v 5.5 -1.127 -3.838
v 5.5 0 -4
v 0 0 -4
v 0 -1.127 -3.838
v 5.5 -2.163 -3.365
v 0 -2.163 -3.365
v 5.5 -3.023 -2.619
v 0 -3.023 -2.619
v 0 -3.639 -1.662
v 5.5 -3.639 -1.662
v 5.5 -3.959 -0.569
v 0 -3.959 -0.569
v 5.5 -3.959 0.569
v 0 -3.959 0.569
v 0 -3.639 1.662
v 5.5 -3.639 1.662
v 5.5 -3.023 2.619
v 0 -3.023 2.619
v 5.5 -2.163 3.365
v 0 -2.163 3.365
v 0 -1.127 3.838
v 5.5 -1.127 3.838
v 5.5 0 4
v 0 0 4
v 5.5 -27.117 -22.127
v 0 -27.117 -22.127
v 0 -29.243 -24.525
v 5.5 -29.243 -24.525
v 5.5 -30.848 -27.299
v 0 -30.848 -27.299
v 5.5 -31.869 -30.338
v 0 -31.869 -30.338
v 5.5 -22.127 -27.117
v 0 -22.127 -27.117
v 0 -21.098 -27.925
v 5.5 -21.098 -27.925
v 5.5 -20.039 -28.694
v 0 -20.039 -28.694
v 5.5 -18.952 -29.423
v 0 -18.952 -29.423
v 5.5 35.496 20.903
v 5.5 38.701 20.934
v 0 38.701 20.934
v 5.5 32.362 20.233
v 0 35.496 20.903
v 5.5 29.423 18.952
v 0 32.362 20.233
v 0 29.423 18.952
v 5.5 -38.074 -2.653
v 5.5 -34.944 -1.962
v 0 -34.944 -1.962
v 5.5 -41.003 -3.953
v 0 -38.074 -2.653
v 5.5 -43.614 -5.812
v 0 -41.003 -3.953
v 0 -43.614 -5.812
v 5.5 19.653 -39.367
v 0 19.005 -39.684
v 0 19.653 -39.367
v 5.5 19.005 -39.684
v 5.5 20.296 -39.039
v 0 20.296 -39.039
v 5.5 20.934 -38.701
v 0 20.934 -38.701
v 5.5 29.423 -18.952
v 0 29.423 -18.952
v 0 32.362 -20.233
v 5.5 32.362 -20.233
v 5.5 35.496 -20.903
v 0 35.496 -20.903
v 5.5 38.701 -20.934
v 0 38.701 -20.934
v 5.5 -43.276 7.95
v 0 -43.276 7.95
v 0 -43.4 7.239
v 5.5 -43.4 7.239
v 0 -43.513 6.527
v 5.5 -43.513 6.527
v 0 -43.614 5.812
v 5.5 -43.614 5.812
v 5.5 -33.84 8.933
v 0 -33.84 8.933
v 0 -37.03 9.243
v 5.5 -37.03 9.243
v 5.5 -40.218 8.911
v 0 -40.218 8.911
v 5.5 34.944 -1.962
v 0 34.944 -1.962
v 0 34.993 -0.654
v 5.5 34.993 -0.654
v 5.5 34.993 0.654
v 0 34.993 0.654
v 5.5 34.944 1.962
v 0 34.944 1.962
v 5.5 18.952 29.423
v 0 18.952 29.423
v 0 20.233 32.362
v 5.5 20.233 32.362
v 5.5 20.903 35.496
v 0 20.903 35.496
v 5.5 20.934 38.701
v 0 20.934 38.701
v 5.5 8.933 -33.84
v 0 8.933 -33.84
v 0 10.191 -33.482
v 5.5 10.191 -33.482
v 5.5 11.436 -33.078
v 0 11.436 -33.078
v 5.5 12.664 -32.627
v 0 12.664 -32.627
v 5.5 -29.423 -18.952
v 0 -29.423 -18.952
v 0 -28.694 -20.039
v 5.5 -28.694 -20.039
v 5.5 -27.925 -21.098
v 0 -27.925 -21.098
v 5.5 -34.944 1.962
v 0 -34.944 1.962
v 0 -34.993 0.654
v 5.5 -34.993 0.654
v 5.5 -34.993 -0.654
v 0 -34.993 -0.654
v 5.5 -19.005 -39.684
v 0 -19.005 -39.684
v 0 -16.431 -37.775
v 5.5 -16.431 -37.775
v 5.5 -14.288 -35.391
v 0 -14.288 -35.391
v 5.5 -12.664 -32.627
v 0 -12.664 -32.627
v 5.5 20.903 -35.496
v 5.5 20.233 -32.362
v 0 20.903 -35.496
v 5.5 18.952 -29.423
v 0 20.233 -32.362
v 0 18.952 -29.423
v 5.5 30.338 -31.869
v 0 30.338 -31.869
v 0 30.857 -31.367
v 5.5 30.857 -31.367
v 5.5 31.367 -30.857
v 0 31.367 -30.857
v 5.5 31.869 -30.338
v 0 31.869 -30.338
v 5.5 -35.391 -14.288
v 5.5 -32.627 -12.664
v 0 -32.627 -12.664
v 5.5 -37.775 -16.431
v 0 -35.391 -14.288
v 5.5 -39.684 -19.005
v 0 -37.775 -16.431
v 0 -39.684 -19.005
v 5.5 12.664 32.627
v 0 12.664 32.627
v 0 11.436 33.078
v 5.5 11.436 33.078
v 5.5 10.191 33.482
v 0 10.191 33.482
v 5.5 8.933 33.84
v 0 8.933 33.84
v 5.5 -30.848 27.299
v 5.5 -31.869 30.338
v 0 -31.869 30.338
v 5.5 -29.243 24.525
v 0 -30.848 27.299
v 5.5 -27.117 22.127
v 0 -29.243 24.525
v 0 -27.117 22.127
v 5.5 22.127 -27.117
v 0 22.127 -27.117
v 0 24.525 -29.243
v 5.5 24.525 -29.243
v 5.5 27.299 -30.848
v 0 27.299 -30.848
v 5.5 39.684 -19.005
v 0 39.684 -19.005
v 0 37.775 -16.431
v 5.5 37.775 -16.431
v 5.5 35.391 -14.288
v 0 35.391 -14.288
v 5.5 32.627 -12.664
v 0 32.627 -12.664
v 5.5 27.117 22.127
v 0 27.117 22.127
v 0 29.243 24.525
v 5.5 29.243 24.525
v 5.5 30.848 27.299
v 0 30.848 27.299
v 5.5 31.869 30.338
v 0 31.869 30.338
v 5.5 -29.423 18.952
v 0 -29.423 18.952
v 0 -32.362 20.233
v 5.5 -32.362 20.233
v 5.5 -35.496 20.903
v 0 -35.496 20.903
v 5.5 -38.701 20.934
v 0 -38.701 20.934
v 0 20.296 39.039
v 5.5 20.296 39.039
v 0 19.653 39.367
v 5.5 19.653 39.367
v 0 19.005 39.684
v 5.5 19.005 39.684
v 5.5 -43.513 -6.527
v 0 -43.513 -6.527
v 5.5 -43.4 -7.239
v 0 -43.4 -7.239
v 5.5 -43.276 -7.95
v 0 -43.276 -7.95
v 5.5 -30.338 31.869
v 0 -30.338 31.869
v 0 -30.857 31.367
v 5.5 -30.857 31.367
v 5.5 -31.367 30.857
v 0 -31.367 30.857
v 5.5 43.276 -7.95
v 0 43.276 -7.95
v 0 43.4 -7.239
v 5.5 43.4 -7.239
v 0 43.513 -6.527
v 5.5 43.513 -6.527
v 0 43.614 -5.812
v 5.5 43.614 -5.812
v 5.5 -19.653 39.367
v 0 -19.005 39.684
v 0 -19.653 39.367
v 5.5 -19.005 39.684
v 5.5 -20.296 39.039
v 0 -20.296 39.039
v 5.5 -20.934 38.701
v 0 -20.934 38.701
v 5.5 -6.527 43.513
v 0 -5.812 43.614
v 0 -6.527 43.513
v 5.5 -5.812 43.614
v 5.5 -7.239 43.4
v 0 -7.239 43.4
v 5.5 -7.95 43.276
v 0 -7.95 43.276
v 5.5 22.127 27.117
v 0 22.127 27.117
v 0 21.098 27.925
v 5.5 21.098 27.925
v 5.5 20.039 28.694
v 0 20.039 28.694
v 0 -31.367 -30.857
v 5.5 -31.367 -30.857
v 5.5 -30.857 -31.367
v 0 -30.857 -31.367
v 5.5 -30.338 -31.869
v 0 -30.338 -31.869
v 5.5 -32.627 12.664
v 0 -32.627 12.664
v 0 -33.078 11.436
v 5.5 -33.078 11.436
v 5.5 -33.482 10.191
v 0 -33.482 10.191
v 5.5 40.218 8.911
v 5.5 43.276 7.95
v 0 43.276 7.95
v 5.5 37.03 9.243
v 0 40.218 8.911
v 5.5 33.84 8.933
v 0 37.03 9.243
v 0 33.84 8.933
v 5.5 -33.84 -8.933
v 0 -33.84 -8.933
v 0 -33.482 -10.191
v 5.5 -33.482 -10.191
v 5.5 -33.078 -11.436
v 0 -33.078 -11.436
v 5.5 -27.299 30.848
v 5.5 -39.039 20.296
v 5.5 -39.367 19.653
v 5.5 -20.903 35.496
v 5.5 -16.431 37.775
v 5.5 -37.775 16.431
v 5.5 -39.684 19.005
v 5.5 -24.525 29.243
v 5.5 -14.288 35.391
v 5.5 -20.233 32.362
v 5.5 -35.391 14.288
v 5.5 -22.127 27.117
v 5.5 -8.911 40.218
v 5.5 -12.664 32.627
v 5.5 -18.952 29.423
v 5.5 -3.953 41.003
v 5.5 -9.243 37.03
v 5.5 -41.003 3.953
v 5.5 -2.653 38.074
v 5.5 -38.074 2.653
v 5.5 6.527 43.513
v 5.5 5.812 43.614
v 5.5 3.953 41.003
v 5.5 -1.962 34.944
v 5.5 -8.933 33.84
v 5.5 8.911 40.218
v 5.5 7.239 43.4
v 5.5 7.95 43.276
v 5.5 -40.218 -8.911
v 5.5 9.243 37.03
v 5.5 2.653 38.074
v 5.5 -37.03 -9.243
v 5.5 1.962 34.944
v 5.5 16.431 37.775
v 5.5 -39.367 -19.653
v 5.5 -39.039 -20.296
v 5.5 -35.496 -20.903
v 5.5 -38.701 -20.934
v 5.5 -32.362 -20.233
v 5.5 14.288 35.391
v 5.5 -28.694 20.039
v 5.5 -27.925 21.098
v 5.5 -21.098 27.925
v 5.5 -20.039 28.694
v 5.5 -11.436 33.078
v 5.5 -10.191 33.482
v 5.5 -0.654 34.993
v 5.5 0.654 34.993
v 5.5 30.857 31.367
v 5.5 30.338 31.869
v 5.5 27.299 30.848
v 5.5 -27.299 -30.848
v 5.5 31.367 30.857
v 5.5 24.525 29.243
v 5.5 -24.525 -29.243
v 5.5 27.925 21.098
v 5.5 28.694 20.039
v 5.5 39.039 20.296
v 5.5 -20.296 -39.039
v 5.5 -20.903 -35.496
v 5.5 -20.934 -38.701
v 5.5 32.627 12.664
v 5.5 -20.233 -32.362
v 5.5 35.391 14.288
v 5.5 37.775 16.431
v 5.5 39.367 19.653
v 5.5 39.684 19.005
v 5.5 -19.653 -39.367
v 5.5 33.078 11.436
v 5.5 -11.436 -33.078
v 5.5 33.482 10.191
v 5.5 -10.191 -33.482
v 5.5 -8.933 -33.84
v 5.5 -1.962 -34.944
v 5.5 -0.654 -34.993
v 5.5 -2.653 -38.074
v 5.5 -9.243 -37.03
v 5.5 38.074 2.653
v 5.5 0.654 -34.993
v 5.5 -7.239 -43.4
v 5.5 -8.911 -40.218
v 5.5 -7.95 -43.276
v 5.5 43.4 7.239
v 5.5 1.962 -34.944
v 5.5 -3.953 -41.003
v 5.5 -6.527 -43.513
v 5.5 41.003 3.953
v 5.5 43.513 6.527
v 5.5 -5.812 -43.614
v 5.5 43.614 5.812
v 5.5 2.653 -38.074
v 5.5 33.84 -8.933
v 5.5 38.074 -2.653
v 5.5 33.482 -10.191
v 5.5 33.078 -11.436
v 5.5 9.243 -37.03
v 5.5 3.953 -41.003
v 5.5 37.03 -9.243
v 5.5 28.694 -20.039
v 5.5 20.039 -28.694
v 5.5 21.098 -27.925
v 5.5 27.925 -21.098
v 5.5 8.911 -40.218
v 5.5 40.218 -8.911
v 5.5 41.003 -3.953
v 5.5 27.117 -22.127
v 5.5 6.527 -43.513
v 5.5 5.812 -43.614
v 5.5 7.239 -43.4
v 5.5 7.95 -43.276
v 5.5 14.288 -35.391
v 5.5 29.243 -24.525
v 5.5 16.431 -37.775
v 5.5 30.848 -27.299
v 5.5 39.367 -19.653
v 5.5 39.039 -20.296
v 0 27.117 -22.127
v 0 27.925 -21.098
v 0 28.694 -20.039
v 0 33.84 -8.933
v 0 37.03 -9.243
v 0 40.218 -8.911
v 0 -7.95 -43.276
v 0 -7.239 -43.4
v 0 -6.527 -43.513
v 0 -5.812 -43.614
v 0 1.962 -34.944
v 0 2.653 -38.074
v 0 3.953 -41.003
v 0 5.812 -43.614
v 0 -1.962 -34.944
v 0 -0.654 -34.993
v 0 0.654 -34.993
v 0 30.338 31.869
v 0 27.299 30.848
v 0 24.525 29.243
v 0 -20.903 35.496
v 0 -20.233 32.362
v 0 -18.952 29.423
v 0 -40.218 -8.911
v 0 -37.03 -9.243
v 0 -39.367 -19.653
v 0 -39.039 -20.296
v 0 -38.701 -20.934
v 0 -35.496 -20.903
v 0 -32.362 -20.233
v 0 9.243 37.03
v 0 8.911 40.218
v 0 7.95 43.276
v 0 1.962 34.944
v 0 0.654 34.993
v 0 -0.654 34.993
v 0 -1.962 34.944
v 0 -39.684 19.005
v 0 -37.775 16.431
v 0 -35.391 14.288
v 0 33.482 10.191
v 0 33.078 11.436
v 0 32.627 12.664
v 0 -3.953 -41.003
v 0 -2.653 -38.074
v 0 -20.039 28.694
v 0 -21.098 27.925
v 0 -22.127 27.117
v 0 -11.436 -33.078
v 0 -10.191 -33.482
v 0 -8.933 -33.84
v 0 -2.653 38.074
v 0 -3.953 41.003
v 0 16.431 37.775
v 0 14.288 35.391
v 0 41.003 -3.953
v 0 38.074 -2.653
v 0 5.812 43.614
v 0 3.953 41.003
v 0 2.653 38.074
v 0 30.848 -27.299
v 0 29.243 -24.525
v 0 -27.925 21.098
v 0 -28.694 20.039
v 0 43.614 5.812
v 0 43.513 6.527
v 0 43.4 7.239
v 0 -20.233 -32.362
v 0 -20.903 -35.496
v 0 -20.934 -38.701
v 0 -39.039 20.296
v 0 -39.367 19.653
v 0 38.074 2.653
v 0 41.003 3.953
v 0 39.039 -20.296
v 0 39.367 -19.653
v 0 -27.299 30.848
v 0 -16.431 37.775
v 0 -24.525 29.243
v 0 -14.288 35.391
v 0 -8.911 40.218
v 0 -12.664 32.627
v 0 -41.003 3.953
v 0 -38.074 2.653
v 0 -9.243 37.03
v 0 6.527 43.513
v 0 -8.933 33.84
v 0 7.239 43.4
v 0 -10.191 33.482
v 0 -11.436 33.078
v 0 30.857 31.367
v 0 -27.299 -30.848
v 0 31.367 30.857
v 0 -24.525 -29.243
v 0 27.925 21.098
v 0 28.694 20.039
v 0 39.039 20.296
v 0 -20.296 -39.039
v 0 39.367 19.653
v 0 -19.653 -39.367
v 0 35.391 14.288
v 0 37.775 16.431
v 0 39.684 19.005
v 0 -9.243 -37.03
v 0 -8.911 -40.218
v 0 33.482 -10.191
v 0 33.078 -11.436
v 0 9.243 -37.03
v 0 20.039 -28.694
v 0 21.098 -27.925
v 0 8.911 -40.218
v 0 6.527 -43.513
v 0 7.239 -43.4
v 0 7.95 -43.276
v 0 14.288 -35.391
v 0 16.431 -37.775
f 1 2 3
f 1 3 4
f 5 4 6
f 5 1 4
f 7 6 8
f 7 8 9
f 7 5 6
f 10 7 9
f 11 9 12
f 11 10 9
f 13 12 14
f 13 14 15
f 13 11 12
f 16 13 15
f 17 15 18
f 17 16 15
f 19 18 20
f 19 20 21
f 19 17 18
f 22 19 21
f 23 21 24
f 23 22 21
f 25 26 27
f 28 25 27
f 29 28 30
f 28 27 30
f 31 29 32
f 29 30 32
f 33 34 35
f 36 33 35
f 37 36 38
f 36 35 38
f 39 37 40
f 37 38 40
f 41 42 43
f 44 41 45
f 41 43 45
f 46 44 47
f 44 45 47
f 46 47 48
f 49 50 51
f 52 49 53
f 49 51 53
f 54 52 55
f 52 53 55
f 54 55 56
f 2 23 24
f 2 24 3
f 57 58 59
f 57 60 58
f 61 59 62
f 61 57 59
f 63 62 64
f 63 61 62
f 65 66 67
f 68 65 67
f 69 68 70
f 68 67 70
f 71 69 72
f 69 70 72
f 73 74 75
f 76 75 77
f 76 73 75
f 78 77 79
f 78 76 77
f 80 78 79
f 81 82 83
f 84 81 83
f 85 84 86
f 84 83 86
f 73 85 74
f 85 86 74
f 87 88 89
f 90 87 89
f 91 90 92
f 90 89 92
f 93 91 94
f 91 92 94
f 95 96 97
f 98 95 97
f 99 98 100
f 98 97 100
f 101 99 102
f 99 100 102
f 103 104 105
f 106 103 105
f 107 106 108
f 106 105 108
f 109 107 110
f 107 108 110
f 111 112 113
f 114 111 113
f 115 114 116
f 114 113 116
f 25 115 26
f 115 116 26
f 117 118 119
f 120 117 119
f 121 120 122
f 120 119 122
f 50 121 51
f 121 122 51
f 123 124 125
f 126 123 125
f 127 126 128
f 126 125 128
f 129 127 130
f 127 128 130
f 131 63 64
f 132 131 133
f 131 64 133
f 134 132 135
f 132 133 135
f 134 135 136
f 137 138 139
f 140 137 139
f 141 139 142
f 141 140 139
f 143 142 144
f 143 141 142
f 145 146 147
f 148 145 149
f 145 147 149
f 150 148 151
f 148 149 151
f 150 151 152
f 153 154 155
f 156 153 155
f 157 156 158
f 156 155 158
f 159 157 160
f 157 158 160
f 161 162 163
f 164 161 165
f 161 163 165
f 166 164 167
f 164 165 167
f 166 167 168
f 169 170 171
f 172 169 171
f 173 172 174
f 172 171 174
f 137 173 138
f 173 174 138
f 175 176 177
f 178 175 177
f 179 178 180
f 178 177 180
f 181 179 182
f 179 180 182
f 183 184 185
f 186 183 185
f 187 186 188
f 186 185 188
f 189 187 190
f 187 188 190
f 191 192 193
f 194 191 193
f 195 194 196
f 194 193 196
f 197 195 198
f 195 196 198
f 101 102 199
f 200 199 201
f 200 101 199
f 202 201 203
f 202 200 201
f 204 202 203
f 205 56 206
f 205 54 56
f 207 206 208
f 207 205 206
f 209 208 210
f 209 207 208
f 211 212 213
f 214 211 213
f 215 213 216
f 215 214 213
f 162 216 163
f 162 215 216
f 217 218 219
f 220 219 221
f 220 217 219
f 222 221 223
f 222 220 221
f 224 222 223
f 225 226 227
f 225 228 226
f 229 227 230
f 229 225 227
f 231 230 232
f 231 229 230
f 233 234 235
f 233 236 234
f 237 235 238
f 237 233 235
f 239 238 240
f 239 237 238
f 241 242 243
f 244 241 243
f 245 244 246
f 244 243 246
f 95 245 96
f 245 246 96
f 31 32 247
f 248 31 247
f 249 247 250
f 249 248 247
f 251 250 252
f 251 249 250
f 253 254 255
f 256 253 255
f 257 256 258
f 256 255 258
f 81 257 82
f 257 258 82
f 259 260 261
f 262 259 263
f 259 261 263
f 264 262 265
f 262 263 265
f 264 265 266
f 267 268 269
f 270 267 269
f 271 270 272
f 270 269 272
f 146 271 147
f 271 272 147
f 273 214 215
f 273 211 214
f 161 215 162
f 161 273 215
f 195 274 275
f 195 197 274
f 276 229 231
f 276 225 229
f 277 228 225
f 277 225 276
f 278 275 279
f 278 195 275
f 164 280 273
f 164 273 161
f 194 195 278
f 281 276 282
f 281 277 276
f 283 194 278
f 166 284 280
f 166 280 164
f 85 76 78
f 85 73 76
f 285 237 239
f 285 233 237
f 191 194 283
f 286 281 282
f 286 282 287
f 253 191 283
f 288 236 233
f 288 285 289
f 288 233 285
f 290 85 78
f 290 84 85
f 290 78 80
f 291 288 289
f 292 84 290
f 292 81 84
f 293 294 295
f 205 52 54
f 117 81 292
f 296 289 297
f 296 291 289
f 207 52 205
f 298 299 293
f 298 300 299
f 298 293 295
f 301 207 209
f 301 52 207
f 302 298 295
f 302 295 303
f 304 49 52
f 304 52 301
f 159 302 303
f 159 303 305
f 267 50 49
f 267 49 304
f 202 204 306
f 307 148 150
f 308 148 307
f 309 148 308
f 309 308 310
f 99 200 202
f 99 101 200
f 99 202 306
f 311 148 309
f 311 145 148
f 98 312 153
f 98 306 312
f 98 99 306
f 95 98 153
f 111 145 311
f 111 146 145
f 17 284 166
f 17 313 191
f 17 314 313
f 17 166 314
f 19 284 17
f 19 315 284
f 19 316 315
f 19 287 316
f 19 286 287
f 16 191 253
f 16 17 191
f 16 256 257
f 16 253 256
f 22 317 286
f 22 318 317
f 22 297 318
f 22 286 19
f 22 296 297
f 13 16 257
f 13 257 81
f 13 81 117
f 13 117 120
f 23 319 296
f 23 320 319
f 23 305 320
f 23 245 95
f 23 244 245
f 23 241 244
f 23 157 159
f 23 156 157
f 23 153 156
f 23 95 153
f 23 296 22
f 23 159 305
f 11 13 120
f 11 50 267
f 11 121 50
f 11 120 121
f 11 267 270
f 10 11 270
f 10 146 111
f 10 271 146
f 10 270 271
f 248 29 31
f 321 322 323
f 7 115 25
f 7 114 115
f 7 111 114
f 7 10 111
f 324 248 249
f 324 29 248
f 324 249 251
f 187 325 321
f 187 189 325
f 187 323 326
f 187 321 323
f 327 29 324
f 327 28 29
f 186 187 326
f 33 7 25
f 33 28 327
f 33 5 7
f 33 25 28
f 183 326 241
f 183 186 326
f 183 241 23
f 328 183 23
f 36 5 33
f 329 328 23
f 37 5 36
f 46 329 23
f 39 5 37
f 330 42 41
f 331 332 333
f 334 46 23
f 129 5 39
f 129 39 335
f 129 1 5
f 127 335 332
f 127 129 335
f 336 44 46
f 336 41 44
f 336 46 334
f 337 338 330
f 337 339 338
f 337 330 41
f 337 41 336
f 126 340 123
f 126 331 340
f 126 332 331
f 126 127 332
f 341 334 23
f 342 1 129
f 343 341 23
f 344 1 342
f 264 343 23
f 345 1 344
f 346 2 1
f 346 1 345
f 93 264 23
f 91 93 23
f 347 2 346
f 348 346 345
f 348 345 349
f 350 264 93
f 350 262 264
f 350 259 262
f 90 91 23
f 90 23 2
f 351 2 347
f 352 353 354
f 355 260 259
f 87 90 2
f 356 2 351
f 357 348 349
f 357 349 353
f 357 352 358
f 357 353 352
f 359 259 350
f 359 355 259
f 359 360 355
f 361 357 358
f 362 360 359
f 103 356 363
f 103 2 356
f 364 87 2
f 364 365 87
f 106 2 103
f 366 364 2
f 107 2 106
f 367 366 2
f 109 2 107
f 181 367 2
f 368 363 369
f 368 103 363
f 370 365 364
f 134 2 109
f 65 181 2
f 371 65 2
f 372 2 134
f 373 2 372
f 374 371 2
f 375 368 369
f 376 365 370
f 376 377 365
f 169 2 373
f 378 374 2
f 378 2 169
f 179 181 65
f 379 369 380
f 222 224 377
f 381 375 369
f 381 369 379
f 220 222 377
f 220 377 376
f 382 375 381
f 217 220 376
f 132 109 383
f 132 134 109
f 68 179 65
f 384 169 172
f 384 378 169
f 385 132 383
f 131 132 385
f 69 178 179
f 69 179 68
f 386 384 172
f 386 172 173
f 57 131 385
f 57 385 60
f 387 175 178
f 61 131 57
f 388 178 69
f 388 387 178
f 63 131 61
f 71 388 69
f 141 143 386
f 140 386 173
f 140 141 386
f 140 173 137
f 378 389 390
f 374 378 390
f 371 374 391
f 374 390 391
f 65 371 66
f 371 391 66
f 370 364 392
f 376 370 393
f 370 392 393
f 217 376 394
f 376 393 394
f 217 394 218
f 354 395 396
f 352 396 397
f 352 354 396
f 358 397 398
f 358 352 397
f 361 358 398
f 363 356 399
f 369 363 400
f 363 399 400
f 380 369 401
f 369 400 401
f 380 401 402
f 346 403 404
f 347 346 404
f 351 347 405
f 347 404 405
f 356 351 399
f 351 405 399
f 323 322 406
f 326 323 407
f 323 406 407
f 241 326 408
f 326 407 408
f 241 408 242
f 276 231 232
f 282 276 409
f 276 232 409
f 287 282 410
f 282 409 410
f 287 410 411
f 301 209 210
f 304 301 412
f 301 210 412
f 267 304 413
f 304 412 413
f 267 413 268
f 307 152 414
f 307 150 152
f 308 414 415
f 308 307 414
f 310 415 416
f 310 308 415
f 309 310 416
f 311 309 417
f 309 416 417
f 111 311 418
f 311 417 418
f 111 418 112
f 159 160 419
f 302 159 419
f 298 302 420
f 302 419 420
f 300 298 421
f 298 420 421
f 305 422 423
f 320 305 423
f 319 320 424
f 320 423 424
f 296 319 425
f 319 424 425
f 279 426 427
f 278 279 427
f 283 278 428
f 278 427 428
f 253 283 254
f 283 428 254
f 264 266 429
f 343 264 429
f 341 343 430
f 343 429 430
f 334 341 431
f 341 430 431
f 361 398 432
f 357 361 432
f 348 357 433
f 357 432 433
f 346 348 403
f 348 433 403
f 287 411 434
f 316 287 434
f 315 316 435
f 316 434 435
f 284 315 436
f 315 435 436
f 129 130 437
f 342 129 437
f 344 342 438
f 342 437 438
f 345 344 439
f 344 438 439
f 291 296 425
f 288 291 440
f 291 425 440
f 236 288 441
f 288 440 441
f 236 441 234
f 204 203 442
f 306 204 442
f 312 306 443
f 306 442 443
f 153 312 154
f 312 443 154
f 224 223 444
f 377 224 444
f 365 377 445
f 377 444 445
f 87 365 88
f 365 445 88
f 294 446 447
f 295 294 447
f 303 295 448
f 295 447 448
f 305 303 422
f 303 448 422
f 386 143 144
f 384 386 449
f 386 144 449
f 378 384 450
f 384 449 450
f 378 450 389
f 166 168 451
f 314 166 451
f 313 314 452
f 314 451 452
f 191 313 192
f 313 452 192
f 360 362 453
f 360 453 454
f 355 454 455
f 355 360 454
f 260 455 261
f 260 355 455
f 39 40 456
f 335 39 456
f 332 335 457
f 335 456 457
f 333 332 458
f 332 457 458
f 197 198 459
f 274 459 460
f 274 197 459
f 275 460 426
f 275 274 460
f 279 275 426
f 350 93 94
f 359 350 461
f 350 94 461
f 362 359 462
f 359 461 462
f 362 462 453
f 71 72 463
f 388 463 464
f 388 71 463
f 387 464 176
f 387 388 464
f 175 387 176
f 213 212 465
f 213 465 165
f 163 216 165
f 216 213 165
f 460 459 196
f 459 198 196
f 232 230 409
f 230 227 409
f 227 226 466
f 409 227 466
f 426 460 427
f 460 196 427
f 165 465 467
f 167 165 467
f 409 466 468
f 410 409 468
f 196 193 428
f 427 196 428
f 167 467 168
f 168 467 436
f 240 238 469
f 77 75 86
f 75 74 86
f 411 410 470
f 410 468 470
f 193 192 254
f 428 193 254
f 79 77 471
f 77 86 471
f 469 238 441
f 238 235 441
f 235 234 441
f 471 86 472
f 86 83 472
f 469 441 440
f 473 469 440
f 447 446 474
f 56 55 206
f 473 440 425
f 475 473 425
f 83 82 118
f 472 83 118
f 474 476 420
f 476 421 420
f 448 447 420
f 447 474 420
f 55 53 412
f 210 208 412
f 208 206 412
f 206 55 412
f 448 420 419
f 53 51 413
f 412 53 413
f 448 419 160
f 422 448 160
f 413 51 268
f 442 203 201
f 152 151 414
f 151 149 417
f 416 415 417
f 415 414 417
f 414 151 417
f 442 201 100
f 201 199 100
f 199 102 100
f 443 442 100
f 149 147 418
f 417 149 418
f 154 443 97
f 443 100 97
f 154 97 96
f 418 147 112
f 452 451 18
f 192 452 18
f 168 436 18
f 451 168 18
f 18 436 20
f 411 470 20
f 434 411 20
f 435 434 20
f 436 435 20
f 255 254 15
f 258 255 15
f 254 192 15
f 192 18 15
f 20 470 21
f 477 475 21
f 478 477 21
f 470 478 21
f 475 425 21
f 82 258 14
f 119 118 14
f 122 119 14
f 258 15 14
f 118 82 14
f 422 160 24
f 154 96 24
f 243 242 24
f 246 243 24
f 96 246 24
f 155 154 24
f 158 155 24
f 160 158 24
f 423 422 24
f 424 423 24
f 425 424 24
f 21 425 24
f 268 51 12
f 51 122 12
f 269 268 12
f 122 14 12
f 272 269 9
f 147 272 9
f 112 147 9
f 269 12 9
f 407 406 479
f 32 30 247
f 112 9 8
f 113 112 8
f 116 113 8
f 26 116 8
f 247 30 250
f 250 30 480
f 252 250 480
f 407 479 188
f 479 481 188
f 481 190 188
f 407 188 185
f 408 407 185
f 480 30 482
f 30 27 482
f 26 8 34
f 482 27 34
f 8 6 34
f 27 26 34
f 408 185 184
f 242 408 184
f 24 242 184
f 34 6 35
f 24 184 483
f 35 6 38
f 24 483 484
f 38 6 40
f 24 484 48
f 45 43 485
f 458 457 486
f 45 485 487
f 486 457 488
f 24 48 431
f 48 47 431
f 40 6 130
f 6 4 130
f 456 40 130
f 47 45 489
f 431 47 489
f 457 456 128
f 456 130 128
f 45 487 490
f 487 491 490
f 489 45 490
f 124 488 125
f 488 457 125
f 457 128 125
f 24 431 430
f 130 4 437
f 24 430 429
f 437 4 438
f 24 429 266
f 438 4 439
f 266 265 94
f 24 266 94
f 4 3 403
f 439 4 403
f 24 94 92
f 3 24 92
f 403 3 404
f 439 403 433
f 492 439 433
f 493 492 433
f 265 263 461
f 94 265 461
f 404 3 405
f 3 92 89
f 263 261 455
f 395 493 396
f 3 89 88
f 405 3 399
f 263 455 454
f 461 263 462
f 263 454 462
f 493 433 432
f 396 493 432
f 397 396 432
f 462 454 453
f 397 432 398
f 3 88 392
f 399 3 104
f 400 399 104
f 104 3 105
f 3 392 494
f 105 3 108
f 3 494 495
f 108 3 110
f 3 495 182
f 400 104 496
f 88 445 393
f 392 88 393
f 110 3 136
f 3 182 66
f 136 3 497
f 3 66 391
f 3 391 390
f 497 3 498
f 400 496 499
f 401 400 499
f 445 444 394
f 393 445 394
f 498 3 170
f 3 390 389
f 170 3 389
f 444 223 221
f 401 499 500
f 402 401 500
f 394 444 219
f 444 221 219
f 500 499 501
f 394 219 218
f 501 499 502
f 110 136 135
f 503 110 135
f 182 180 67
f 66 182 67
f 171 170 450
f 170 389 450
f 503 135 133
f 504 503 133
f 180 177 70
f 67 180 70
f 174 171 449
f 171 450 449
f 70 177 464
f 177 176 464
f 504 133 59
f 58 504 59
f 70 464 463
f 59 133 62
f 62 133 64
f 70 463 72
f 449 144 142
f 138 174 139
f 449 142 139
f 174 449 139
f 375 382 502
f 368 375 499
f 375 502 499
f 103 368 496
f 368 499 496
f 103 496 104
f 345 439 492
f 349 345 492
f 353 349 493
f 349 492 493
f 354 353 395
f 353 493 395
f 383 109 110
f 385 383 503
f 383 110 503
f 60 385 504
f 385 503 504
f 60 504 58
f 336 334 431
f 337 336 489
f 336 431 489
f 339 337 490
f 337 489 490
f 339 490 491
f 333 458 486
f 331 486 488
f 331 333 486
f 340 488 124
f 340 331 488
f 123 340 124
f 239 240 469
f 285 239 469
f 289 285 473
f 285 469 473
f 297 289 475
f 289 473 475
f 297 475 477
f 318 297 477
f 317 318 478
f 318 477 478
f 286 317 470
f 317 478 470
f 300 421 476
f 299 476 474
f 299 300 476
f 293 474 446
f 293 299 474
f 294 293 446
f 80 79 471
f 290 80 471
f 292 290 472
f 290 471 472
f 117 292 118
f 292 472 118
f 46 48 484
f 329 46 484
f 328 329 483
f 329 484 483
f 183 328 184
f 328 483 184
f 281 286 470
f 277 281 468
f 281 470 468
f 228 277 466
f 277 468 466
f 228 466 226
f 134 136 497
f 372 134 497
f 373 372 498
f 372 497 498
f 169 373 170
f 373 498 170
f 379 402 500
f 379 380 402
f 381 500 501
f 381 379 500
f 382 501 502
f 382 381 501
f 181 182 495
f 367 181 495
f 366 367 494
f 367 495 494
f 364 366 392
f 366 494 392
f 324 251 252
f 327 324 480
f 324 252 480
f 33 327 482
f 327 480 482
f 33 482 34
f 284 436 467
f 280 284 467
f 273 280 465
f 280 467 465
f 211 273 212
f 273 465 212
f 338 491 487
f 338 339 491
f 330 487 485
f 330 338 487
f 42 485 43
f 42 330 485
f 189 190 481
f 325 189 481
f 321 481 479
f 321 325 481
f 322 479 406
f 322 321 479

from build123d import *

# Parameters (mm, degrees)
BASPROSKE_W             = 5.5
BASPROSKE_H             = 44
TOOTHCUT_DEPTH          = 63.467991804
TEETHCUTS_COUNT         = 20
TEETHCUTS_ANGLE         = 342
BORSKE_R                = 0.5
BORE_DEPTH              = 50.0000508
CORTAR_EXTRUIR1_DEPTH   = 5.5
SALIENTE_EXTRUIR1_DEPTH = 5.5


with BuildPart() as part:
    # BasProSke → Base-Revolve (revolve)
    with BuildSketch(Plane(origin=(0, 0, 0), x_dir=(1, 0, 0), z_dir=(0, 1, 0)), mode=Mode.PRIVATE) as base_revolve_sk:
        with Locations((2.75, 22)):
            Rectangle(BASPROSKE_W, BASPROSKE_H)
    revolve(base_revolve_sk.sketch.rotate(Axis((-10, 0, 0), (1, 0, 0)), 180), axis=Axis((-10, 0, 0), (1, 0, 0)))

    # TooCutSke → ToothCut (cut, through all)
    with BuildSketch(Plane(origin=(0, 0, 0), x_dir=(0, 0, -1), z_dir=(1, 0, 0))):
        with BuildLine():
            ThreePointArc((1.961730392, 34.943978235), (0, 34.999), (-1.961730392, 34.943978235))
            ThreePointArc((-1.961730392, 34.943978235), (-3.235659864, 39.585086827), (-5.832115241, 43.637395396))
            ThreePointArc((-5.832115241, 43.637395396), (0, 44.0254), (5.832115241, 43.637395396))
            ThreePointArc((5.832115241, 43.637395396), (3.235659864, 39.585086827), (1.961730392, 34.943978235))
        make_face()
    toothcut = extrude(amount=TOOTHCUT_DEPTH, mode=Mode.SUBTRACT)

    # TeethCuts: ToothCut ×20 about axis
    teethcuts_axis = Axis((-10, 0, 0), (1, 0, 0))
    for i in range(1, TEETHCUTS_COUNT):
        add(toothcut.rotate(teethcuts_axis, i * TEETHCUTS_ANGLE / (TEETHCUTS_COUNT - 1)), mode=Mode.SUBTRACT)

    # BorSke → Bore (cut, symmetric)
    with BuildSketch(Plane(origin=(0, 0, 0), x_dir=(0, 0, -1), z_dir=(1, 0, 0))):
        with Locations(Location((0, 0, 0), (0, 0, 180))):
            Circle(BORSKE_R)
    extrude(amount=BORE_DEPTH, both=True, mode=Mode.SUBTRACT)

    # Croquis1 → Cortar-Extruir1 (cut)
    with BuildSketch(Plane(origin=(5.5, 0, 0), x_dir=(0, 0, -1), z_dir=(1, 0, 0))):
        with BuildLine():
            Line((-4, 0), (4, 0))
            ThreePointArc((4, 0), (0, -4), (-4, 0))
        make_face()
    extrude(amount=-CORTAR_EXTRUIR1_DEPTH, mode=Mode.SUBTRACT)

    # Croquis2 → Saliente-Extruir1 (add)
    with BuildSketch(Plane(origin=(5.5, 0, 0), x_dir=(0, 0, -1), z_dir=(1, 0, 0))):
        with BuildLine():
            Line((-0.5, 0), (0.5, 0))
            ThreePointArc((0.5, 0), (0, 0.5), (-0.5, 0))
        make_face()
    extrude(amount=-SALIENTE_EXTRUIR1_DEPTH)


solid = part.part
